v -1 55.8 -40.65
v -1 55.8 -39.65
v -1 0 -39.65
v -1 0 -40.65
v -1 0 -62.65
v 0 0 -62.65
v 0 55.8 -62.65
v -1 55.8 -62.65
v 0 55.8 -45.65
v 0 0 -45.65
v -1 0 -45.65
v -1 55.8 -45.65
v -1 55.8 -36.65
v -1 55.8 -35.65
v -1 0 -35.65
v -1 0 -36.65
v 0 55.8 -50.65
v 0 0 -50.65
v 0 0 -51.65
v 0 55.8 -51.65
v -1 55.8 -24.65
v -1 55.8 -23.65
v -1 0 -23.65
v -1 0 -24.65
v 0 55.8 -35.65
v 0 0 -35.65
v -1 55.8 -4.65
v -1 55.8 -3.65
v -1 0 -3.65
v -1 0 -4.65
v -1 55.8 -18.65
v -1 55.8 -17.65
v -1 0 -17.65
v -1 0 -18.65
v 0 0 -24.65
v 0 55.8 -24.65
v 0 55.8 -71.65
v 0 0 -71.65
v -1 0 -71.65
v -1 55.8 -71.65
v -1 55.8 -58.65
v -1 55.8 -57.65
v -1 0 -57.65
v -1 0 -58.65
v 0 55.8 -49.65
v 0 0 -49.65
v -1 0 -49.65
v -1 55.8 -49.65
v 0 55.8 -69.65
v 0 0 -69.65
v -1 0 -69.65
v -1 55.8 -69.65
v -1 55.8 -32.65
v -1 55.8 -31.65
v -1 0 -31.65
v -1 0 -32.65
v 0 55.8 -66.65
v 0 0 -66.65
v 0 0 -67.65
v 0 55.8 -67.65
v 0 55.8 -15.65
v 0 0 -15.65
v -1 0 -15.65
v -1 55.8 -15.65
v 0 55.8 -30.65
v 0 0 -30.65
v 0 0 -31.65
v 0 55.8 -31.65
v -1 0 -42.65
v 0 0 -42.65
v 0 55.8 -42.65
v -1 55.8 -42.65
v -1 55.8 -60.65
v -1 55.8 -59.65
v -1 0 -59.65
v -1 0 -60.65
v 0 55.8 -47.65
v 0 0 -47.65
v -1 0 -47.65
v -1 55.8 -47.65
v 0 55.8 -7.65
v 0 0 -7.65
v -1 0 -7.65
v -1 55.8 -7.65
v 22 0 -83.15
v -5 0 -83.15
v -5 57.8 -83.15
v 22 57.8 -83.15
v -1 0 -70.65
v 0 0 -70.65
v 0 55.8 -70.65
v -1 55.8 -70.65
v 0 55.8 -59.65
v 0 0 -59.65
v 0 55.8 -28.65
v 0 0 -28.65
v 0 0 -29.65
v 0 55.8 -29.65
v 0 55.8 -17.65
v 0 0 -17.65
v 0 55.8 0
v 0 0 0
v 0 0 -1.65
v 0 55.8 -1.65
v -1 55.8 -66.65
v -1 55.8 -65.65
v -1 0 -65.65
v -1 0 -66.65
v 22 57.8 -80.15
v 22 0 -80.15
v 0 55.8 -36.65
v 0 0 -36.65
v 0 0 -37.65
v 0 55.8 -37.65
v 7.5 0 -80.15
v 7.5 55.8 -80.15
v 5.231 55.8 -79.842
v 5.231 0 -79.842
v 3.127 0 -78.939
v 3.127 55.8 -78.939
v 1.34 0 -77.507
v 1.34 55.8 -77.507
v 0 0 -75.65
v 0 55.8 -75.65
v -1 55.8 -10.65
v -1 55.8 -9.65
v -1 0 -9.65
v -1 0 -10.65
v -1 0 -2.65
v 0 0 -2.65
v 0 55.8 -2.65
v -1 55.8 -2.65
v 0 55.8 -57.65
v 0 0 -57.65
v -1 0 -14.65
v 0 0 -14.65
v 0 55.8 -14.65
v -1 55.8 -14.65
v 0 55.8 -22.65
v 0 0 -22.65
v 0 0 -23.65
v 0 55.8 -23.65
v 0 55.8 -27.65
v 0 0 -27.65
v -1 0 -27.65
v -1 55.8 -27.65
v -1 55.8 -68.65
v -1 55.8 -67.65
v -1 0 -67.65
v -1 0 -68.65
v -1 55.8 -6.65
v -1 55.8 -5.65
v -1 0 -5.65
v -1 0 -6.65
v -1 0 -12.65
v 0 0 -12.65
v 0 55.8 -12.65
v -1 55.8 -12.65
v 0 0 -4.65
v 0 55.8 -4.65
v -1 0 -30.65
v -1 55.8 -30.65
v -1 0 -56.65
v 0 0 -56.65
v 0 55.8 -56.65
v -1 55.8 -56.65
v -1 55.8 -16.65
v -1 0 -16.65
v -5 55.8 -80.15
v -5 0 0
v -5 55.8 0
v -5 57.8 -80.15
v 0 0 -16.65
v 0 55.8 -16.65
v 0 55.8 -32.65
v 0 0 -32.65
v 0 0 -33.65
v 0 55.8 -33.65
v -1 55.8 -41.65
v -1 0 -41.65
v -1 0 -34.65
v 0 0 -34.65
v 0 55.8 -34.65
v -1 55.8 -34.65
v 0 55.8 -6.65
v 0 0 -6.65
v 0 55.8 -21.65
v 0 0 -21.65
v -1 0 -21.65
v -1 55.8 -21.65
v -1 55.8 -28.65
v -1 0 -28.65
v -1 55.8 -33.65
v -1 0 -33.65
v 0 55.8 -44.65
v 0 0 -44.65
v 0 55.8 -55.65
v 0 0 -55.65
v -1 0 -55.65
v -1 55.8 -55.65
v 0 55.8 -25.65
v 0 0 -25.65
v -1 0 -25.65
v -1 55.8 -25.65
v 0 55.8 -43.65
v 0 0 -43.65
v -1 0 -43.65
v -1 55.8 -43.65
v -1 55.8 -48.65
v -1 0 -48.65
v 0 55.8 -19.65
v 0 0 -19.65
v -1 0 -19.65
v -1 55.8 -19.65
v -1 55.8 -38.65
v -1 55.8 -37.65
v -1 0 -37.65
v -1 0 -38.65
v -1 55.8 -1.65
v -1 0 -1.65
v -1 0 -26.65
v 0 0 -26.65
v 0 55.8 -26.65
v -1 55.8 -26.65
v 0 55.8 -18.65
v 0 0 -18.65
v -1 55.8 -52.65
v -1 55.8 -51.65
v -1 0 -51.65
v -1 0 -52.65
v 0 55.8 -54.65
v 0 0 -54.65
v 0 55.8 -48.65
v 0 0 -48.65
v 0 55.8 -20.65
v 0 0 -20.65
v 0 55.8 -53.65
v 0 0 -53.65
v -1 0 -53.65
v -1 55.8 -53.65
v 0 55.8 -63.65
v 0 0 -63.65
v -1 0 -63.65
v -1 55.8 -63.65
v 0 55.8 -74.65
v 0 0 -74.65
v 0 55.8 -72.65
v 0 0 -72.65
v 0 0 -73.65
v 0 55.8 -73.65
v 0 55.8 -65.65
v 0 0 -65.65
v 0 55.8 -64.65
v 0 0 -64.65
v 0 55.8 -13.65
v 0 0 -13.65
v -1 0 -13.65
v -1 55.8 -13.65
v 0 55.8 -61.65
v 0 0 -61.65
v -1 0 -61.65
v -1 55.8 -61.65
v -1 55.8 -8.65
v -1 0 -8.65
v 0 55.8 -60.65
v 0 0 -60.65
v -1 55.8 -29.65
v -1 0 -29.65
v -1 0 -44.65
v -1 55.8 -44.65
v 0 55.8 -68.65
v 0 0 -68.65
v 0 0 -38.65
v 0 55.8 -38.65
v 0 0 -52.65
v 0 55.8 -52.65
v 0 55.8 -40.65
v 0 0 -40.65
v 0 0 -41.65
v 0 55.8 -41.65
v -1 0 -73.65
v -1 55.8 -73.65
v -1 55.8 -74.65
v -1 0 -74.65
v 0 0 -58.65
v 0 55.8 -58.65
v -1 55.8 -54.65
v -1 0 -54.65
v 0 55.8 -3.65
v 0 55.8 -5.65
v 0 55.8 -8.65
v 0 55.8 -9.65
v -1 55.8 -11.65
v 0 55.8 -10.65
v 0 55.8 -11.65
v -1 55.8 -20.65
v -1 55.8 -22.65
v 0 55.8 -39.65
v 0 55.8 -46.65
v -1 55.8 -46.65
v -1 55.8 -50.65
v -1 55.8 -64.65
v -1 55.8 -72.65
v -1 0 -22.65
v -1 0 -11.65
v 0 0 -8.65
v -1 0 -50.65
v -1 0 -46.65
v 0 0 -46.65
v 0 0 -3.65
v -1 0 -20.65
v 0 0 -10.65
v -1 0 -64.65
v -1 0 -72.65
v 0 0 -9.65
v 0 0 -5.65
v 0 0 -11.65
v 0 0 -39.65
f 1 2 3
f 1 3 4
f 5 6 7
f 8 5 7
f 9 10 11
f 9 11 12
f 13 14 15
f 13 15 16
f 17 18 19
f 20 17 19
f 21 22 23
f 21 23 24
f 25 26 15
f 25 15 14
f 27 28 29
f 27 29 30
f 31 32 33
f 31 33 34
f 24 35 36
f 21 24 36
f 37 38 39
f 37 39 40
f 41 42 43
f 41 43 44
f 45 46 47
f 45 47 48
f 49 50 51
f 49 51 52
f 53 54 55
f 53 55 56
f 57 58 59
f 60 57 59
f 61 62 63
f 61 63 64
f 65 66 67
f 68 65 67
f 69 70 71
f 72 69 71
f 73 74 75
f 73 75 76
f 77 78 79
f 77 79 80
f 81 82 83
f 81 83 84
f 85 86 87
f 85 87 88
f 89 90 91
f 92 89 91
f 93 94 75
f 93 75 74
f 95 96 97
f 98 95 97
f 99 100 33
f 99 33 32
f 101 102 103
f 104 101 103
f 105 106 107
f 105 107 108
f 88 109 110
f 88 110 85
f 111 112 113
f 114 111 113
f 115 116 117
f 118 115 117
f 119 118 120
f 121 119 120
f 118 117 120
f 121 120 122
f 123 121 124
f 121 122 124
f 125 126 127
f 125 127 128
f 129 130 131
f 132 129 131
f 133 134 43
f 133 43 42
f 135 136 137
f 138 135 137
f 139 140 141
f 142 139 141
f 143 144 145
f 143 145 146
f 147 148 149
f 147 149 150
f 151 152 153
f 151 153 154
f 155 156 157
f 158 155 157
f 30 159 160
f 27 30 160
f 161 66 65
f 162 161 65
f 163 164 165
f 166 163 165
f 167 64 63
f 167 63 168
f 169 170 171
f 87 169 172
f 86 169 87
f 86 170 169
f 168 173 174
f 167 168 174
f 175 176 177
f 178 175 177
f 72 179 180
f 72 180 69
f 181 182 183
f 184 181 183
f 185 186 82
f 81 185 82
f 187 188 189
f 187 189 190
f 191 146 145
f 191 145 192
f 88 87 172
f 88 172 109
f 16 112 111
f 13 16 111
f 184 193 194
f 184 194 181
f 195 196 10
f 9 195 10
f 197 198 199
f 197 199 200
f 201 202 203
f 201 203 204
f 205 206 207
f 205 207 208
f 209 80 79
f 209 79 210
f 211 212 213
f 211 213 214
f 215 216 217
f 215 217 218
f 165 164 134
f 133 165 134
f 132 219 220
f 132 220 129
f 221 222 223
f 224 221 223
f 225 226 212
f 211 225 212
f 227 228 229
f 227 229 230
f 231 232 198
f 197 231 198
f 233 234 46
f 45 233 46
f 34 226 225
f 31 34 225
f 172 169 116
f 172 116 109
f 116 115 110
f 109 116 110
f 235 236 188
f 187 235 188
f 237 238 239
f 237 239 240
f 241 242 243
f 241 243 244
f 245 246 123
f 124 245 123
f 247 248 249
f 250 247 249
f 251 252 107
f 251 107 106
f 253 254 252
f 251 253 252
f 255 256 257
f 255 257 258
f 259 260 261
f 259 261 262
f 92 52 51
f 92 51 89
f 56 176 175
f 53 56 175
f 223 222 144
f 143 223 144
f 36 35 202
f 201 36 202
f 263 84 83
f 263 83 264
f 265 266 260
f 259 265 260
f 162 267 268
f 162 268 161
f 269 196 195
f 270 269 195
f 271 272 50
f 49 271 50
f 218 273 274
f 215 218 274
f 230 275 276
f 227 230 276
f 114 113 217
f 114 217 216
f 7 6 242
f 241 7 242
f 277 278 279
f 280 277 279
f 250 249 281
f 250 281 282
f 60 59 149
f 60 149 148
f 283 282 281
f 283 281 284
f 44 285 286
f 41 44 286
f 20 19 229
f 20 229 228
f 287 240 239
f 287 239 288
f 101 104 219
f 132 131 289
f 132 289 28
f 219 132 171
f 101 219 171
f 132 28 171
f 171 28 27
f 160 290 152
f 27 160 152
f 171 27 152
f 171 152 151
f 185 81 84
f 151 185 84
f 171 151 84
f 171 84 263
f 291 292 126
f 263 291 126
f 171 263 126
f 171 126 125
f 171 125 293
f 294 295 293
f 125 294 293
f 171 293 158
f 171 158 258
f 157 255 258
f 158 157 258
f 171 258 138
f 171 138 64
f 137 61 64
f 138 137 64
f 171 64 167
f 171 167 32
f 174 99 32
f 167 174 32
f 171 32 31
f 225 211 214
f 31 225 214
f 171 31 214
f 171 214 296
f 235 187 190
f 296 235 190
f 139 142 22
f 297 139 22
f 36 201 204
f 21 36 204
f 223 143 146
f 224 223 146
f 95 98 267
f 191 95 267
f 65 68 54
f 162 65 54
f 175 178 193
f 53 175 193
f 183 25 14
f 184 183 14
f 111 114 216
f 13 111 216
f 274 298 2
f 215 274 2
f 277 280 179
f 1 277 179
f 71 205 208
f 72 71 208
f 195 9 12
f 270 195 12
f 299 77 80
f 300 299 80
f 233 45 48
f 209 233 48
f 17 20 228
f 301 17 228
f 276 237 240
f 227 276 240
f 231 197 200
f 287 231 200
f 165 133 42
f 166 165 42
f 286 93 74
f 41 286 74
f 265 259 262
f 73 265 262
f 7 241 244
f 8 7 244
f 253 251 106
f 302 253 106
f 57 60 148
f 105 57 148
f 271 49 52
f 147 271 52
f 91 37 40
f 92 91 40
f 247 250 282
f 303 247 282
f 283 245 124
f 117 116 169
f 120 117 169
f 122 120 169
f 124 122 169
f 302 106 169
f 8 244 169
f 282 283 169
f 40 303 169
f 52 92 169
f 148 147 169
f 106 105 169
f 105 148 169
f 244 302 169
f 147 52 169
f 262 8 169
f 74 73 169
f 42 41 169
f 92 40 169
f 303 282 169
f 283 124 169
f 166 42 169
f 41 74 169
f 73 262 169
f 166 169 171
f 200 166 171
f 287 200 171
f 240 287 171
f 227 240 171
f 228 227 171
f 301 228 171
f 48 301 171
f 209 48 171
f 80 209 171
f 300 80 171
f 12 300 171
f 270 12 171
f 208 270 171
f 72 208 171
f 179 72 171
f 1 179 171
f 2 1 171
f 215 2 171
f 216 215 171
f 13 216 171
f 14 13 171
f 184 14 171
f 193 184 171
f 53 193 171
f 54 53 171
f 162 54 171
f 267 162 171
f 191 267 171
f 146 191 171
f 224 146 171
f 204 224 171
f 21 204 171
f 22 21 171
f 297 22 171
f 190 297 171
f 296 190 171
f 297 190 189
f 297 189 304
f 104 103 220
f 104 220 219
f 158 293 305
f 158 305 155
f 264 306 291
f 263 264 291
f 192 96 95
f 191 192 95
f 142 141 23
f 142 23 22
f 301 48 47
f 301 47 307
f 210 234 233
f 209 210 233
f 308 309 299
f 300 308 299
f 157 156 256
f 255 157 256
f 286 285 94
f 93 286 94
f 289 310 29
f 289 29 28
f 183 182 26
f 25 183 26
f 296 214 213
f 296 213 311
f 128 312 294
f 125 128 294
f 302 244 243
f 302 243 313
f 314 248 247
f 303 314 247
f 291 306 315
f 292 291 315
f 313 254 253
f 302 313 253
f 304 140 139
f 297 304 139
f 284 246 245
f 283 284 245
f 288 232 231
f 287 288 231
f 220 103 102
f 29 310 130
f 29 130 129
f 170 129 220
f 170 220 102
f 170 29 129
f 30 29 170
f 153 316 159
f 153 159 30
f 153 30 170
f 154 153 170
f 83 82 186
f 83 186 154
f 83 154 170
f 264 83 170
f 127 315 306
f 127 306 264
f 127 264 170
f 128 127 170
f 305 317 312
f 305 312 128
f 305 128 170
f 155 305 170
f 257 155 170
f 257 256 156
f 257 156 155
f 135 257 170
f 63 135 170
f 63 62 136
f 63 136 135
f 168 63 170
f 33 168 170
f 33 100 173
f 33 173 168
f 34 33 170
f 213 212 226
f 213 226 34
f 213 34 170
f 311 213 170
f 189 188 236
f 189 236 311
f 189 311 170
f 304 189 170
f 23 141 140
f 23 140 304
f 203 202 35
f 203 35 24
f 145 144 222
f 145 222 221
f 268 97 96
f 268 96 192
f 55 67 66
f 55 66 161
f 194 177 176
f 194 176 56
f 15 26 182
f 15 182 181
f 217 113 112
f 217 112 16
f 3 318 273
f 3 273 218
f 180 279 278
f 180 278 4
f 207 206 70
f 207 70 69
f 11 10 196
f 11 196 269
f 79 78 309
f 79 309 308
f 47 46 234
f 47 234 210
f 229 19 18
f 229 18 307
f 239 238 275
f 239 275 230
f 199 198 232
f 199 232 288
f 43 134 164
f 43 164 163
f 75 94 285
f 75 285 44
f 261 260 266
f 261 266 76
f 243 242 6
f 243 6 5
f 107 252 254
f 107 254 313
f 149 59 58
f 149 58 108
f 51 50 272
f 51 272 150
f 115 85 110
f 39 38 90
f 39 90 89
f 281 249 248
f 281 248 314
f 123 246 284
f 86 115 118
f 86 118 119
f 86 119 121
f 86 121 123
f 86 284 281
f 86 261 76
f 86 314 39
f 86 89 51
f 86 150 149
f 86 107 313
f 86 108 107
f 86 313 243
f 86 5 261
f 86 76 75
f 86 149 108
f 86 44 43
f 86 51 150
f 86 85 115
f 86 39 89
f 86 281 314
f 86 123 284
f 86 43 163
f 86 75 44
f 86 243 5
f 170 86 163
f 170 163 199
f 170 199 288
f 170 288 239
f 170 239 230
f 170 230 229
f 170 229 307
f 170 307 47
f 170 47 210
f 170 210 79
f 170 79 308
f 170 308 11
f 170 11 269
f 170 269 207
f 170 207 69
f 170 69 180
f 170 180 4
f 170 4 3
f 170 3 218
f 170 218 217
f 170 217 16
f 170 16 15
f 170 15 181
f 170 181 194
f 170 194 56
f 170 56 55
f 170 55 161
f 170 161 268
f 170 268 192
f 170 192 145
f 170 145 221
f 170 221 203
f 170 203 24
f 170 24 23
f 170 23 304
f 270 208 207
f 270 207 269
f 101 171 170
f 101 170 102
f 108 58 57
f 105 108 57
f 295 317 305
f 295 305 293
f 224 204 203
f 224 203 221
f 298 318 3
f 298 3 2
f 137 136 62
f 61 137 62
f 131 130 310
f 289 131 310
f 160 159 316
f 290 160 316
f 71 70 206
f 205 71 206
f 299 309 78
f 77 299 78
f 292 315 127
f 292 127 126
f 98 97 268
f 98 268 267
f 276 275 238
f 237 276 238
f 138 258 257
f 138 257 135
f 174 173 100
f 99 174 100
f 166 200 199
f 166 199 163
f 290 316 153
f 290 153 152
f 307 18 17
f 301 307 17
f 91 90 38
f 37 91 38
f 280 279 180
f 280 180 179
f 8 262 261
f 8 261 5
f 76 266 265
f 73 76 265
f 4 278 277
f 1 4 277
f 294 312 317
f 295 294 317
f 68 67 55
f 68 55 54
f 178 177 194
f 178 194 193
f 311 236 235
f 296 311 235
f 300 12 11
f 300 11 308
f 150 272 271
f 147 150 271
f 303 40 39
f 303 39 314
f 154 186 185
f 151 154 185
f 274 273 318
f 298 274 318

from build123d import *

# Parameters (mm, degrees)
BOSS_EXTRUDE1_DEPTH = 55.8
BOSS_EXTRUDE2_DEPTH = 55.8
SKETCH5_W           = 1
SKETCH5_H           = 55.8
CUT_EXTRUDE3_DEPTH  = 1
LPATTERN1_COUNT     = 37
LPATTERN1_PITCH     = 2
SKETCH6_W           = 27
SKETCH6_H           = 3
BOSS_EXTRUDE3_DEPTH = 2


with BuildPart() as part:
    # Sketch1 → Boss-Extrude1 (new body)
    with BuildSketch(Plane(origin=(0, 0, 0), x_dir=(1, 0, 0), z_dir=(0, 1, 0))):
        Polygon((0, 0), (0, 80.15), (22, 80.15), (22, 83.15), (0, 83.15), (-5, 83.15), (-5, 0), align=None)
    extrude(amount=BOSS_EXTRUDE1_DEPTH)

    # Sketch2 → Boss-Extrude2 (add)
    with BuildSketch(Plane(origin=(0, 55.8, 0), x_dir=(1, 0, 0), z_dir=(0, 1, 0))):
        with BuildLine():
            Line((0, 80.15), (7.5, 80.15))
            ThreePointArc((7.5, 80.15), (3.126786079, 78.938689869), (0, 75.65))
            Line((0, 75.65), (0, 80.15))
        make_face()
    extrude(amount=-BOSS_EXTRUDE2_DEPTH)

    # Sketch5 → Cut-Extrude3 (cut)
    with BuildSketch(Plane(origin=(0, 0, 0), x_dir=(0, 0, -1), z_dir=(1, 0, 0))):
        with Locations((74.15, 27.9)):
            Rectangle(SKETCH5_W, SKETCH5_H)
    cut_extrude3 = extrude(amount=-CUT_EXTRUDE3_DEPTH, mode=Mode.SUBTRACT)

    # LPattern1: Cut-Extrude3 ×37
    with Locations(*[(0, 0, i * LPATTERN1_PITCH) for i in range(1, LPATTERN1_COUNT)]):
        add(cut_extrude3, mode=Mode.SUBTRACT)

    # Sketch6 → Boss-Extrude3 (add)
    with BuildSketch(Plane(origin=(0, 55.8, 0), x_dir=(1, 0, 0), z_dir=(0, 1, 0))):
        with Locations((8.5, 81.65)):
            Rectangle(SKETCH6_W, SKETCH6_H)
    extrude(amount=BOSS_EXTRUDE3_DEPTH)


solid = part.part
